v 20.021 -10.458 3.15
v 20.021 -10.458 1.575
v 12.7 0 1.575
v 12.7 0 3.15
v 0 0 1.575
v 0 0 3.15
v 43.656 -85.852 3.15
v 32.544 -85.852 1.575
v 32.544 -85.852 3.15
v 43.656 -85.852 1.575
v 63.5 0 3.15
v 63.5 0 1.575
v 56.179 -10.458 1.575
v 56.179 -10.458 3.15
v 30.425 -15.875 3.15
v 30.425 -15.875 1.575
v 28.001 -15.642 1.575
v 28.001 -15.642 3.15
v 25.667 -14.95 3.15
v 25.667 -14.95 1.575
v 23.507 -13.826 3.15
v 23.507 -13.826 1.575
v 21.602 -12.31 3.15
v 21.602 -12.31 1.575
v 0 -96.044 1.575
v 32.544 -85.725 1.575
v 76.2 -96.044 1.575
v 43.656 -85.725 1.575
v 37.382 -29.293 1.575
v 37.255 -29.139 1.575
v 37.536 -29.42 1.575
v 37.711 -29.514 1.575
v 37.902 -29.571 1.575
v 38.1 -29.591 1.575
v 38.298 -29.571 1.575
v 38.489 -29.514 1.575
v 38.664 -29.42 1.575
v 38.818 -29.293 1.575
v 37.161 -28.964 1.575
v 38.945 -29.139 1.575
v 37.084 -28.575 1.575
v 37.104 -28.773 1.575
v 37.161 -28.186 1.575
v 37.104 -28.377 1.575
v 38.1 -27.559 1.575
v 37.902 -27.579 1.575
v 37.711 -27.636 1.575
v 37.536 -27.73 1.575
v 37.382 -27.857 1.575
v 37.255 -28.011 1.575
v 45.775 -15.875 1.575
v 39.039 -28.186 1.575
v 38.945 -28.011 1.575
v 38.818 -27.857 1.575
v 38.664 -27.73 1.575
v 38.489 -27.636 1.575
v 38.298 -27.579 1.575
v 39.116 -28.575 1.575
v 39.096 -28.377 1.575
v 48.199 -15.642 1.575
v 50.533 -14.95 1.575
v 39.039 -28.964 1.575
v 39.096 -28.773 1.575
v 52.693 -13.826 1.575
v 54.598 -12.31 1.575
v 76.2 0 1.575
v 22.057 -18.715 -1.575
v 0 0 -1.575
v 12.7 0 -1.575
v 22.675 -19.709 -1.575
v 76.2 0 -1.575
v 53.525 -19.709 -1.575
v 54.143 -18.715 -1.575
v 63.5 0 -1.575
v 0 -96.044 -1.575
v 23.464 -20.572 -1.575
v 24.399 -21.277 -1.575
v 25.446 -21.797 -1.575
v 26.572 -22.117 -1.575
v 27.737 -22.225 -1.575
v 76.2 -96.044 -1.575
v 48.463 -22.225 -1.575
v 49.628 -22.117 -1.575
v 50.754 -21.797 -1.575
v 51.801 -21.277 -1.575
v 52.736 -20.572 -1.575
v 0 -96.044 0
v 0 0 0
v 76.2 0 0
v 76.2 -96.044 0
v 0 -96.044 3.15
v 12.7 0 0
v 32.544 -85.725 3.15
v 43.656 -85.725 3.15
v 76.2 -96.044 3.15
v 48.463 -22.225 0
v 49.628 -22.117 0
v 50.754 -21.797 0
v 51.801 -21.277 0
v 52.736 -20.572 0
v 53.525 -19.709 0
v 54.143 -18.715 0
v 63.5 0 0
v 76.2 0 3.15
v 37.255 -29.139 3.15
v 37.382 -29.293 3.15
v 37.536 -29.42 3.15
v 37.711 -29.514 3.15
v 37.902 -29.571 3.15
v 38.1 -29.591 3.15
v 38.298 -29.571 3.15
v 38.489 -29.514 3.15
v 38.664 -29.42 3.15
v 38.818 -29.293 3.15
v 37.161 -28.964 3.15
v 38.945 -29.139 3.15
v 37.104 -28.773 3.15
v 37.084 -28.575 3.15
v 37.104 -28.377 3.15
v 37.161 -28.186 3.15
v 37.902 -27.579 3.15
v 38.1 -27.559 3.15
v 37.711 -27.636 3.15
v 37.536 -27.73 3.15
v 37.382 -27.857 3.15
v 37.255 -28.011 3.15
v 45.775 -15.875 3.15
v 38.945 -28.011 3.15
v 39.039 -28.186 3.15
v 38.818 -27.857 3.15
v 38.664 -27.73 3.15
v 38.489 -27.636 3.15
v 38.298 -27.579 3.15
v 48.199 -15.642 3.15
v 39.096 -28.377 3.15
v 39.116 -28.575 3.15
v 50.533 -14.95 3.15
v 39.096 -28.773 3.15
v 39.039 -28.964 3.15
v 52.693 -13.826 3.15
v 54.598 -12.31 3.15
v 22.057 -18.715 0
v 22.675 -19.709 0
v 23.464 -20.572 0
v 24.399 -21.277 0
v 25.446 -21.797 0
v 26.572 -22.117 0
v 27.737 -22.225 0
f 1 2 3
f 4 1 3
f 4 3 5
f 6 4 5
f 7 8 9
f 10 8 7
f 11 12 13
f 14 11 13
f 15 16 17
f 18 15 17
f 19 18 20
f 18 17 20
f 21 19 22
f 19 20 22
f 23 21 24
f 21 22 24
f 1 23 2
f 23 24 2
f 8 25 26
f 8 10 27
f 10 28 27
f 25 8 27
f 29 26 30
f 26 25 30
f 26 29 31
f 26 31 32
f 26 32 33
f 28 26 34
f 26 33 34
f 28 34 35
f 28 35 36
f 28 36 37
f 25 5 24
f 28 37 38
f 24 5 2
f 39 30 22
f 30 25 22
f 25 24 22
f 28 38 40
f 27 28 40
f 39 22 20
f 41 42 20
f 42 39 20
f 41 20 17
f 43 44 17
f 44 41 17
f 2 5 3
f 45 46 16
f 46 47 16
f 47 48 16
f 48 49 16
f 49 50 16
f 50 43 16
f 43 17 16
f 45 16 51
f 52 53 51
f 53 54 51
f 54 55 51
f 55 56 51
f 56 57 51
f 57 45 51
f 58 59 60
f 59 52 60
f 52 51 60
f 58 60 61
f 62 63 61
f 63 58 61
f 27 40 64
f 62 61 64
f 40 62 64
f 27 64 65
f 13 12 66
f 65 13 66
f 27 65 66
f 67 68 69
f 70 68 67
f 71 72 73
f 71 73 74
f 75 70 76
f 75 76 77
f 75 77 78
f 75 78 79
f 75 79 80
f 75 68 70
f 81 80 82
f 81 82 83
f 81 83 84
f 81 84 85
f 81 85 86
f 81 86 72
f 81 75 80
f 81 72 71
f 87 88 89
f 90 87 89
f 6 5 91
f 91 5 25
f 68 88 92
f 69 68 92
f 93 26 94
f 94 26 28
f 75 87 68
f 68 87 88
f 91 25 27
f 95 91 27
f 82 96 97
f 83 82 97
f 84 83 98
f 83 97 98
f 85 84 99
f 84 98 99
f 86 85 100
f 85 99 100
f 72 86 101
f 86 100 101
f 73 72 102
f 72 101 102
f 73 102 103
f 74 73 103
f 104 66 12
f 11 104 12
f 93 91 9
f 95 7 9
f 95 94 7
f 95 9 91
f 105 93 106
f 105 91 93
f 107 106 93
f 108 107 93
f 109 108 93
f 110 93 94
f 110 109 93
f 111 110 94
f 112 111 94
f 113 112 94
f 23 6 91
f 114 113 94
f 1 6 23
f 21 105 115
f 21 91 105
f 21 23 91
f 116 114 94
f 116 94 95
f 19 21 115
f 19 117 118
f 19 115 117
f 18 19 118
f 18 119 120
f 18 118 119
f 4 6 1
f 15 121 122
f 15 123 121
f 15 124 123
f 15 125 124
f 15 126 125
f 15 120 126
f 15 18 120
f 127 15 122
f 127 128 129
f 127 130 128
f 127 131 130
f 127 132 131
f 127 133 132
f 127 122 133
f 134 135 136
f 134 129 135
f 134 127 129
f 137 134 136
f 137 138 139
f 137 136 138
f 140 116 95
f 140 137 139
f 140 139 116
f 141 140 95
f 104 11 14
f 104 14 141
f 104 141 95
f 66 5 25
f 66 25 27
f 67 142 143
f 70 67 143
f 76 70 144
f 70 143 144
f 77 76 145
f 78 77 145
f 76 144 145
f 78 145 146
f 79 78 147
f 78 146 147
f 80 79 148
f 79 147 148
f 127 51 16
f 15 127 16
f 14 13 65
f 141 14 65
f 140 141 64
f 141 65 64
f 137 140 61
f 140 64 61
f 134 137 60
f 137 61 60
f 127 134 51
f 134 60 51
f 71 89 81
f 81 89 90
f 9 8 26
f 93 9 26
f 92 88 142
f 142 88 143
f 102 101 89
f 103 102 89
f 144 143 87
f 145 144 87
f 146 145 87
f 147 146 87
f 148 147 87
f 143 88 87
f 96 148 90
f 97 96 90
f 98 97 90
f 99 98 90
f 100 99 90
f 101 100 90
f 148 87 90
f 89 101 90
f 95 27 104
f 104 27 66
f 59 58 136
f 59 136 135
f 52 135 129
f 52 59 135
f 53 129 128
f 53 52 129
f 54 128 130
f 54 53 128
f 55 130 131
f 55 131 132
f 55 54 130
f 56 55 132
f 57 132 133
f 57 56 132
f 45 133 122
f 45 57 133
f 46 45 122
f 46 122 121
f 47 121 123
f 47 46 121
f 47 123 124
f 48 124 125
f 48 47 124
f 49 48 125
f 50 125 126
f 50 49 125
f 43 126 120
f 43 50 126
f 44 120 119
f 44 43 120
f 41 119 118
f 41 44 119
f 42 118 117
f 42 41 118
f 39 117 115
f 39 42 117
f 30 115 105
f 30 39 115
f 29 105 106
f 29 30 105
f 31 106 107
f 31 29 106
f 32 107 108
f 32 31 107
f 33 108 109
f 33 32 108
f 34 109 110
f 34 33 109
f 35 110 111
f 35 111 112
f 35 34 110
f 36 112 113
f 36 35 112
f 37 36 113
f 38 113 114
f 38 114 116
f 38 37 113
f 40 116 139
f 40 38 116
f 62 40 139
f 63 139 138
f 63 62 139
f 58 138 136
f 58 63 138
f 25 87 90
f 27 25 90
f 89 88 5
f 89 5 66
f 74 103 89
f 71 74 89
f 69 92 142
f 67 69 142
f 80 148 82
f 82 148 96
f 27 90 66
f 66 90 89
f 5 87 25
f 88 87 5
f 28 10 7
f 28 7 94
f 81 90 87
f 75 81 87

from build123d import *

# Parameters (mm, degrees)
F0_W     = 76.2
F0_H     = 96.04375
F1_DEPTH = 1.5748
F2_W     = 11.1125
F2_H     = 0.127
F2_R     = 1.016
F3_DEPTH = 1.5748
F5_DEPTH = 1.5748


# Not quite as in the source:
# - a feature of the source that left no trace in its solid (it failed there, or was rolled back) is left out


with BuildPart() as f1:
    # F0 (on Top) → F1 (new body)
    with BuildSketch(Plane.XY):
        with Locations((38.1, -48.021875)):
            Rectangle(F0_W, F0_H)
    extrude(amount=F1_DEPTH)


with BuildPart() as f3:
    # F2 (on face) → F3 (new body)
    with BuildSketch(Plane.XY.offset(1.5748)):
        with BuildLine():
            Line((0, 0), (0, -96.04375))
            Line((0, -96.04375), (76.2, -96.04375))
            Line((76.2, -96.04375), (76.2, 0))
            Line((76.2, 0), (63.5, 0))
            Line((63.5, 0), (56.1794197586, -10.4579717734))
            ThreePointArc((56.1794197586, -10.4579717734), (51.6401662042, -14.4396291888), (45.775174368, -15.875))
            Line((45.775174368, -15.875), (38.1, -15.875))
            Line((38.1, -15.875), (30.424825632, -15.875))
            ThreePointArc((30.424825632, -15.875), (24.5598337958, -14.4396291888), (20.0205802414, -10.4579717734))
            Line((20.0205802414, -10.4579717734), (12.7, 0))
            Line((12.7, 0), (0, 0))
        make_face()
        with Locations((38.1, -85.7885)):
            Rectangle(F2_W, F2_H, mode=Mode.SUBTRACT)
        with Locations((38.1, -28.575)):
            Circle(F2_R, mode=Mode.SUBTRACT)
    extrude(amount=F3_DEPTH)


with BuildPart() as f5:
    # F4 (on face) → F5 (new body)
    with BuildSketch(Plane(origin=(0, 0, 0), x_dir=(1, 0, 0), z_dir=(0, 0, -1))):
        with BuildLine():
            Line((76.2, 96.04375), (0, 96.04375))
            Line((0, 96.04375), (0, 0))
            Line((0, 0), (12.7, 0))
            Line((12.7, 0), (22.0574031657, 18.7148063314))
            ThreePointArc((22.0574031657, 18.7148063314), (24.3986232666, 21.276632633), (27.7370158286, 22.225))
            Line((27.7370158286, 22.225), (38.1, 22.225))
            Line((38.1, 22.225), (48.4629841714, 22.225))
            ThreePointArc((48.4629841714, 22.225), (51.8013767334, 21.276632633), (54.1425968343, 18.7148063314))
            Line((54.1425968343, 18.7148063314), (63.5, 0))
            Line((63.5, 0), (76.2, 0))
            Line((76.2, 0), (76.2, 96.04375))
        make_face()
    extrude(amount=F5_DEPTH)


solid = Compound([f1.part, f3.part, f5.part])
